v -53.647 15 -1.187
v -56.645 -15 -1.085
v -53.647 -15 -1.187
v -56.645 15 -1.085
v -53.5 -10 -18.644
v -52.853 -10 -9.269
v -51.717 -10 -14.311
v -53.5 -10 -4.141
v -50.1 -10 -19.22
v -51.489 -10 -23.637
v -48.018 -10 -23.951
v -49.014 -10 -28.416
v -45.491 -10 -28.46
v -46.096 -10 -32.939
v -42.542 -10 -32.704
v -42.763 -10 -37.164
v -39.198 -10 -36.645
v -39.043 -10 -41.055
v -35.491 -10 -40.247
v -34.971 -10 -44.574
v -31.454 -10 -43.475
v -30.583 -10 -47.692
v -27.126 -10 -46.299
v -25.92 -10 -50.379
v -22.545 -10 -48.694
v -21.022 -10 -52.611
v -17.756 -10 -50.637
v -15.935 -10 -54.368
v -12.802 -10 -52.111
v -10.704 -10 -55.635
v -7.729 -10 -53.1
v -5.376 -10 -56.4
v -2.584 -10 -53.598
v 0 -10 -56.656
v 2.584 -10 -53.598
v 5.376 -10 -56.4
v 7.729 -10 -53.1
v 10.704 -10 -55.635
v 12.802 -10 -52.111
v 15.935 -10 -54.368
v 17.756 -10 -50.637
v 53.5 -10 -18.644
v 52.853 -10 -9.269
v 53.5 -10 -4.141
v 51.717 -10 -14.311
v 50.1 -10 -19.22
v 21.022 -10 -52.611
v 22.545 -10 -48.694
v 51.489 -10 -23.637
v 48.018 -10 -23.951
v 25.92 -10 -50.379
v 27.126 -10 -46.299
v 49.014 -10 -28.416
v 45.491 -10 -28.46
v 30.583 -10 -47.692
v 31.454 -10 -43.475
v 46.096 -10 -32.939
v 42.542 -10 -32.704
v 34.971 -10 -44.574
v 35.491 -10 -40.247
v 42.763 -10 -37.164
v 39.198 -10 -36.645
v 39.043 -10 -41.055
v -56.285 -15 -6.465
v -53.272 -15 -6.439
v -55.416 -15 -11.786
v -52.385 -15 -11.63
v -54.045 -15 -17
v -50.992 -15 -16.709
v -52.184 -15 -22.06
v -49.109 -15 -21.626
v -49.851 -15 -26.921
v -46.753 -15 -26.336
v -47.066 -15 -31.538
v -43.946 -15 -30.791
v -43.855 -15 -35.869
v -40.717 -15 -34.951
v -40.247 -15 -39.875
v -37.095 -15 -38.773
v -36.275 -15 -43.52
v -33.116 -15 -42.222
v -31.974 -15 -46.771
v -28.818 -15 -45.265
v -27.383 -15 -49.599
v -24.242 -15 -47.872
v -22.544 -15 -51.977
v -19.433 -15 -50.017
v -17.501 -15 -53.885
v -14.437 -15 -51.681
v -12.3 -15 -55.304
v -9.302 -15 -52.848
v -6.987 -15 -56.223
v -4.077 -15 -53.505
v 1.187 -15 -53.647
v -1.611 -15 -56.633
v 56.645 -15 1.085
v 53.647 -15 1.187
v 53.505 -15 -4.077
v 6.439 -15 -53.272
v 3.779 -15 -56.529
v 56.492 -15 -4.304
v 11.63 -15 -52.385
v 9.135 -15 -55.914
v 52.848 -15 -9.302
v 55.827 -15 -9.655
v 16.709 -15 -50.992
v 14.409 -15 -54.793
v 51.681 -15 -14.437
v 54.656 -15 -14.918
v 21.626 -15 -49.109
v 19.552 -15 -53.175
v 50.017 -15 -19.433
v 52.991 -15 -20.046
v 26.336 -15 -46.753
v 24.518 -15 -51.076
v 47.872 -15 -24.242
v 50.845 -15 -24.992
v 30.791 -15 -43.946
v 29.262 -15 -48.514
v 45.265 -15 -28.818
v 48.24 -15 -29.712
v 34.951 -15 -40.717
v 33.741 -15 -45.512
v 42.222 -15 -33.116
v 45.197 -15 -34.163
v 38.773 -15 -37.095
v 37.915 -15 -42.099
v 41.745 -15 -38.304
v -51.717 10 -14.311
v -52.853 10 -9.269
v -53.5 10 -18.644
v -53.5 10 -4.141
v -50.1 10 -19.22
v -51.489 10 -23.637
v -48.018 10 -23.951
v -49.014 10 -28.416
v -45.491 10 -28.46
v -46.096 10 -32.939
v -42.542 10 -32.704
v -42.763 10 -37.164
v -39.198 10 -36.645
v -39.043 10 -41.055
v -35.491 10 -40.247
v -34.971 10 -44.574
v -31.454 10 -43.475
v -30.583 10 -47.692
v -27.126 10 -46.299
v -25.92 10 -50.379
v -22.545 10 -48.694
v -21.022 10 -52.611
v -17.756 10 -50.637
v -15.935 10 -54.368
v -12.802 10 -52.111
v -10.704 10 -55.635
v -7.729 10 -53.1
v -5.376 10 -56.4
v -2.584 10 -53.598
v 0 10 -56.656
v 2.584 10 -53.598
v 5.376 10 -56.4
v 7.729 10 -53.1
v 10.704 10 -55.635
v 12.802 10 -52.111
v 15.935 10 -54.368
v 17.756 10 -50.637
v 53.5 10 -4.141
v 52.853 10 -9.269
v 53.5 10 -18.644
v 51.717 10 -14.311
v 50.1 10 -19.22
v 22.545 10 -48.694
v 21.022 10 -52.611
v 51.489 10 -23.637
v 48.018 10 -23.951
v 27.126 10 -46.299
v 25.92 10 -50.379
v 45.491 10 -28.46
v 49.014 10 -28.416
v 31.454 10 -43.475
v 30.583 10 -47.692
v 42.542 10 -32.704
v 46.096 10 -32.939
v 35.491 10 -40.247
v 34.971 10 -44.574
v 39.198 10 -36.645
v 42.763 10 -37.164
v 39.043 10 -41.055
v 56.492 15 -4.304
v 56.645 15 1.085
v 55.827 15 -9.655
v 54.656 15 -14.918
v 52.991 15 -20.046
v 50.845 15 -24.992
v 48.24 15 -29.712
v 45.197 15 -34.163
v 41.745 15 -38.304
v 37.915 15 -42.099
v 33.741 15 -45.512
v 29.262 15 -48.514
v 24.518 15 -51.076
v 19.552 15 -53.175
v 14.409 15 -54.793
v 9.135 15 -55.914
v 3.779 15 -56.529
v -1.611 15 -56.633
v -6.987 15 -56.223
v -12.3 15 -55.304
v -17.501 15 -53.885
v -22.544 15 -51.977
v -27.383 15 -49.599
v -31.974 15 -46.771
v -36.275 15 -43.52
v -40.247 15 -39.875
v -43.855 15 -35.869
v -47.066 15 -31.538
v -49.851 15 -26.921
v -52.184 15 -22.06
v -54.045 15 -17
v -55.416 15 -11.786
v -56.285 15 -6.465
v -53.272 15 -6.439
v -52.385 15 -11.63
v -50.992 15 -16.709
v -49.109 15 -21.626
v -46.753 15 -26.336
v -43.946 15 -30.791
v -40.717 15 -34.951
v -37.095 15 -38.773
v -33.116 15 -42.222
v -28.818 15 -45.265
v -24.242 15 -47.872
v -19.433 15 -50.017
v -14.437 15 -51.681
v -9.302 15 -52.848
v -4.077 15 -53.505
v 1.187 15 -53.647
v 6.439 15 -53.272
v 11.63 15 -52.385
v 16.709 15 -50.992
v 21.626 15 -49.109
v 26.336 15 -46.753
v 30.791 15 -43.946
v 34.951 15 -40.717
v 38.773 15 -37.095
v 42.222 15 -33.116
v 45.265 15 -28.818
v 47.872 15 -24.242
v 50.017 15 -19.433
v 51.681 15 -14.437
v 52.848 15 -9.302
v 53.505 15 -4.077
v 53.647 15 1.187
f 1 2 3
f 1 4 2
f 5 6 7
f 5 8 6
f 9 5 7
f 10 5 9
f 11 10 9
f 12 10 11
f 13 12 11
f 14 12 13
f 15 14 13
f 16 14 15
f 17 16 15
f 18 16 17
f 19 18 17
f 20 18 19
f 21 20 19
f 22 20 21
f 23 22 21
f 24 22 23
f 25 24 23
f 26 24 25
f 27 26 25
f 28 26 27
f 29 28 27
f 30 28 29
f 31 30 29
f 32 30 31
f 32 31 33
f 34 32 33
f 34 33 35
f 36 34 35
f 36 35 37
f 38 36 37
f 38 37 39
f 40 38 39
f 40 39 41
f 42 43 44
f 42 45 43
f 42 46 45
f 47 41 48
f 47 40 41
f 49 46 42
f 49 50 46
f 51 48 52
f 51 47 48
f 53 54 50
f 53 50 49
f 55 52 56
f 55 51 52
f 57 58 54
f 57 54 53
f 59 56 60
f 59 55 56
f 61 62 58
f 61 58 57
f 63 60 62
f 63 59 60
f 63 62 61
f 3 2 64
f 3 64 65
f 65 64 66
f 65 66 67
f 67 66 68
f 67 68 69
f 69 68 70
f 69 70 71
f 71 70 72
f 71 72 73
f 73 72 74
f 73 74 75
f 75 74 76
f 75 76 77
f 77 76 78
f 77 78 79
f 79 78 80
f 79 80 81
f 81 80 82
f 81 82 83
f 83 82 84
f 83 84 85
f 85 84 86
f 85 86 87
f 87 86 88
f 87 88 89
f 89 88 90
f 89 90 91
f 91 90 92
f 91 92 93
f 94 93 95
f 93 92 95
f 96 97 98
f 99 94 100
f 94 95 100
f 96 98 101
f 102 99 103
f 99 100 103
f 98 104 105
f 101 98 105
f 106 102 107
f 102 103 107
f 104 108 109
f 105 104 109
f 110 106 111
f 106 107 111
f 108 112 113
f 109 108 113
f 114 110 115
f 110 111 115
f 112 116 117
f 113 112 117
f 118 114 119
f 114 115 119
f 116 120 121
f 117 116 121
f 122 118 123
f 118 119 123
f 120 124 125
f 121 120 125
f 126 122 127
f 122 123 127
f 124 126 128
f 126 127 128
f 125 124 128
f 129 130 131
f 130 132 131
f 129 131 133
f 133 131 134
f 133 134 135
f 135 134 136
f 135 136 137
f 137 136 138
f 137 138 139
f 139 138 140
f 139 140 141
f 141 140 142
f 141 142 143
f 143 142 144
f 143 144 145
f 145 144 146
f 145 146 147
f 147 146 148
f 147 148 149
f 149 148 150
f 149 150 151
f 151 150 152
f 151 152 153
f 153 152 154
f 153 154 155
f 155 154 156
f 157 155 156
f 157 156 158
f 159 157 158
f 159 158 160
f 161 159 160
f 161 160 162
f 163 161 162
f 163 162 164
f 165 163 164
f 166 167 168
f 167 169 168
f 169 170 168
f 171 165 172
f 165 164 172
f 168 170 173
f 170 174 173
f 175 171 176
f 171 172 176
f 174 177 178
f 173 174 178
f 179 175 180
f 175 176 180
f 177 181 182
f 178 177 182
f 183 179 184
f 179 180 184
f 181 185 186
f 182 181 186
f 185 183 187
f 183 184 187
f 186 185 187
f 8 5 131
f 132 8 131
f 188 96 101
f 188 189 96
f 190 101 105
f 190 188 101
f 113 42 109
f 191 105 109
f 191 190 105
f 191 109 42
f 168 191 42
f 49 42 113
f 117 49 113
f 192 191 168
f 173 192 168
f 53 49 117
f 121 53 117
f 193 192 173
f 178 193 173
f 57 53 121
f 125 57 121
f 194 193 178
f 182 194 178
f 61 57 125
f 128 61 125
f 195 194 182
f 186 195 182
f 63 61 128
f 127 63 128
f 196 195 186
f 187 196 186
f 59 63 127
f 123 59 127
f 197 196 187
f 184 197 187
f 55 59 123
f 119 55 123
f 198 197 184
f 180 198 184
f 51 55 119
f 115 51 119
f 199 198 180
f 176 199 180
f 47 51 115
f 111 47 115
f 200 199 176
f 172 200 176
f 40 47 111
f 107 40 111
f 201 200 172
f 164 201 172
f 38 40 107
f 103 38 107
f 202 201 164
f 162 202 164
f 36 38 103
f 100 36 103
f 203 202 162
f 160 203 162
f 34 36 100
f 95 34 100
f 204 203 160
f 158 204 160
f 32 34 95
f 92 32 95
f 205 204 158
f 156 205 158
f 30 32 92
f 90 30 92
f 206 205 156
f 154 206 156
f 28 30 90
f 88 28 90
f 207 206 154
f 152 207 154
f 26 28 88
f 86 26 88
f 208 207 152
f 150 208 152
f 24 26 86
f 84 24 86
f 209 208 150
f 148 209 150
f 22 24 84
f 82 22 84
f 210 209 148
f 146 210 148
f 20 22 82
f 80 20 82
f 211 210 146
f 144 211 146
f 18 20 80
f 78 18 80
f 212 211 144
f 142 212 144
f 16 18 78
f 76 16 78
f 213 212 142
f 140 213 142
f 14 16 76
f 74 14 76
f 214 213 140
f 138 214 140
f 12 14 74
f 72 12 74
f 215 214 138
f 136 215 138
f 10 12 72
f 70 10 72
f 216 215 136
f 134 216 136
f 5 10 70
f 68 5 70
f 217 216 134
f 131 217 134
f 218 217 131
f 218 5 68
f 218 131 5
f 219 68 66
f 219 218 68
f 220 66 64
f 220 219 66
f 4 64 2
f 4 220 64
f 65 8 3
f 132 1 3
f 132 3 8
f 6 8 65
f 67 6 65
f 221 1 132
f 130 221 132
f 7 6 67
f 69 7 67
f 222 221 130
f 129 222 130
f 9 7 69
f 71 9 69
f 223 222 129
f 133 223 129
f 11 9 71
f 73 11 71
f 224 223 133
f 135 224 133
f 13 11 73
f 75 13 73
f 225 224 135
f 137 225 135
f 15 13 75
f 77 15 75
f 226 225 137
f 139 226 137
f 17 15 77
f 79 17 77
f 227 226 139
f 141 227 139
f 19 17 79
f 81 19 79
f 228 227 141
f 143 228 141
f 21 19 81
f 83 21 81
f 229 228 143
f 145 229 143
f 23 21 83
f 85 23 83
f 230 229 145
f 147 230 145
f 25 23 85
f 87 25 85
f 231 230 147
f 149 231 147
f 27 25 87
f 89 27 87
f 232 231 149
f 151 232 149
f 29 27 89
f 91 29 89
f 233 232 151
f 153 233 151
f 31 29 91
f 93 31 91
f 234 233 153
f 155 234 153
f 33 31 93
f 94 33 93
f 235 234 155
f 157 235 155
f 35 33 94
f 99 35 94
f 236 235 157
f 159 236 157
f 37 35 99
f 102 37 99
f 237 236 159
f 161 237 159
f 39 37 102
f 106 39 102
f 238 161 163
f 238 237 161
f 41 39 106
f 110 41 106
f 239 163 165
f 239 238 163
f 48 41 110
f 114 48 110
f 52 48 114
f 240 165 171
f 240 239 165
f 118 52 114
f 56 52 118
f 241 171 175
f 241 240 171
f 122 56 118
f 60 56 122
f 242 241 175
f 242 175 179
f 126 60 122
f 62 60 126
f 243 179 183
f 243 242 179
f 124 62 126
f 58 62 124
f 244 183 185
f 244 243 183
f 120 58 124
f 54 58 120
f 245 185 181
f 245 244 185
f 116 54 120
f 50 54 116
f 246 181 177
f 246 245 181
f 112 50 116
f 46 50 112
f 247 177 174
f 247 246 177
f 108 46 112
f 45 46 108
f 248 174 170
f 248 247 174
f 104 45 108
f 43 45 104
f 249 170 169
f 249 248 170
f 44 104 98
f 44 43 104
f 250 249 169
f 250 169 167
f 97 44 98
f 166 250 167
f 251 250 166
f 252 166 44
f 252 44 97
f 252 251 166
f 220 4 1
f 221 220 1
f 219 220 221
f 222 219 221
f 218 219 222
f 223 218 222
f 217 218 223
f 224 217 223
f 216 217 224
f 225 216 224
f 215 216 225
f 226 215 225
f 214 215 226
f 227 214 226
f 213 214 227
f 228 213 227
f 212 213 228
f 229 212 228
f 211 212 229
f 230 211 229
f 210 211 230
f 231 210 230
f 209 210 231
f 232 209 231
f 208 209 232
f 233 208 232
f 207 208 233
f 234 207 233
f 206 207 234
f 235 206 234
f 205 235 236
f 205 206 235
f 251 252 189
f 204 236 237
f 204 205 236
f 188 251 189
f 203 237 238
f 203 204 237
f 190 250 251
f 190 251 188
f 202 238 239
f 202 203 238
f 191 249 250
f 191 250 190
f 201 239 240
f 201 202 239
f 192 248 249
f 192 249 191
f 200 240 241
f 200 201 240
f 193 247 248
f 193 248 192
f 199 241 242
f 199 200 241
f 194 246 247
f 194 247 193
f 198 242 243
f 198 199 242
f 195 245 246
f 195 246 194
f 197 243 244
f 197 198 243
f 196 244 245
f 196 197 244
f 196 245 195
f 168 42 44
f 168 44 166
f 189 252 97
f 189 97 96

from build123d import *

# Parameters (mm, degrees)
BOSS_EXTRUDE1_DEPTH     = 15
CUT_EXTRUDE1_DEPTH      = 82.515026332
CUT_EXTRUDE1_DEPTH_BACK = 200
SKETCH3_W               = 107
SKETCH3_H               = 20


with BuildPart() as part:
    # Sketch1 → Boss-Extrude1 (new, symmetric)
    with BuildSketch(Plane(origin=(0, 0, 0), x_dir=(1, 0, 0), z_dir=(0, 1, 0))):
        with BuildLine():
            Line((-56.6451424, 1.085173475), (-53.646875163, 1.186754079))
            ThreePointArc((-53.646875163, 1.186754079), (1.186754079, 53.646875163), (53.646875163, -1.186754079))
            Line((53.646875163, -1.186754079), (56.645146911, -1.084937955))
            ThreePointArc((56.645146911, -1.084937955), (1.085055715, 56.645144656), (-56.6451424, 1.085173475))
        make_face()
    extrude(amount=BOSS_EXTRUDE1_DEPTH, both=True)

    # Sketch3 → Cut-Extrude1 (cut, two sides: drawn at the far end of the back side and taken through both)
    with BuildSketch(Plane.XY.offset(-CUT_EXTRUDE1_DEPTH_BACK)):
        Rectangle(SKETCH3_W, SKETCH3_H)
    extrude(amount=CUT_EXTRUDE1_DEPTH + CUT_EXTRUDE1_DEPTH_BACK, mode=Mode.SUBTRACT)


solid = part.part
